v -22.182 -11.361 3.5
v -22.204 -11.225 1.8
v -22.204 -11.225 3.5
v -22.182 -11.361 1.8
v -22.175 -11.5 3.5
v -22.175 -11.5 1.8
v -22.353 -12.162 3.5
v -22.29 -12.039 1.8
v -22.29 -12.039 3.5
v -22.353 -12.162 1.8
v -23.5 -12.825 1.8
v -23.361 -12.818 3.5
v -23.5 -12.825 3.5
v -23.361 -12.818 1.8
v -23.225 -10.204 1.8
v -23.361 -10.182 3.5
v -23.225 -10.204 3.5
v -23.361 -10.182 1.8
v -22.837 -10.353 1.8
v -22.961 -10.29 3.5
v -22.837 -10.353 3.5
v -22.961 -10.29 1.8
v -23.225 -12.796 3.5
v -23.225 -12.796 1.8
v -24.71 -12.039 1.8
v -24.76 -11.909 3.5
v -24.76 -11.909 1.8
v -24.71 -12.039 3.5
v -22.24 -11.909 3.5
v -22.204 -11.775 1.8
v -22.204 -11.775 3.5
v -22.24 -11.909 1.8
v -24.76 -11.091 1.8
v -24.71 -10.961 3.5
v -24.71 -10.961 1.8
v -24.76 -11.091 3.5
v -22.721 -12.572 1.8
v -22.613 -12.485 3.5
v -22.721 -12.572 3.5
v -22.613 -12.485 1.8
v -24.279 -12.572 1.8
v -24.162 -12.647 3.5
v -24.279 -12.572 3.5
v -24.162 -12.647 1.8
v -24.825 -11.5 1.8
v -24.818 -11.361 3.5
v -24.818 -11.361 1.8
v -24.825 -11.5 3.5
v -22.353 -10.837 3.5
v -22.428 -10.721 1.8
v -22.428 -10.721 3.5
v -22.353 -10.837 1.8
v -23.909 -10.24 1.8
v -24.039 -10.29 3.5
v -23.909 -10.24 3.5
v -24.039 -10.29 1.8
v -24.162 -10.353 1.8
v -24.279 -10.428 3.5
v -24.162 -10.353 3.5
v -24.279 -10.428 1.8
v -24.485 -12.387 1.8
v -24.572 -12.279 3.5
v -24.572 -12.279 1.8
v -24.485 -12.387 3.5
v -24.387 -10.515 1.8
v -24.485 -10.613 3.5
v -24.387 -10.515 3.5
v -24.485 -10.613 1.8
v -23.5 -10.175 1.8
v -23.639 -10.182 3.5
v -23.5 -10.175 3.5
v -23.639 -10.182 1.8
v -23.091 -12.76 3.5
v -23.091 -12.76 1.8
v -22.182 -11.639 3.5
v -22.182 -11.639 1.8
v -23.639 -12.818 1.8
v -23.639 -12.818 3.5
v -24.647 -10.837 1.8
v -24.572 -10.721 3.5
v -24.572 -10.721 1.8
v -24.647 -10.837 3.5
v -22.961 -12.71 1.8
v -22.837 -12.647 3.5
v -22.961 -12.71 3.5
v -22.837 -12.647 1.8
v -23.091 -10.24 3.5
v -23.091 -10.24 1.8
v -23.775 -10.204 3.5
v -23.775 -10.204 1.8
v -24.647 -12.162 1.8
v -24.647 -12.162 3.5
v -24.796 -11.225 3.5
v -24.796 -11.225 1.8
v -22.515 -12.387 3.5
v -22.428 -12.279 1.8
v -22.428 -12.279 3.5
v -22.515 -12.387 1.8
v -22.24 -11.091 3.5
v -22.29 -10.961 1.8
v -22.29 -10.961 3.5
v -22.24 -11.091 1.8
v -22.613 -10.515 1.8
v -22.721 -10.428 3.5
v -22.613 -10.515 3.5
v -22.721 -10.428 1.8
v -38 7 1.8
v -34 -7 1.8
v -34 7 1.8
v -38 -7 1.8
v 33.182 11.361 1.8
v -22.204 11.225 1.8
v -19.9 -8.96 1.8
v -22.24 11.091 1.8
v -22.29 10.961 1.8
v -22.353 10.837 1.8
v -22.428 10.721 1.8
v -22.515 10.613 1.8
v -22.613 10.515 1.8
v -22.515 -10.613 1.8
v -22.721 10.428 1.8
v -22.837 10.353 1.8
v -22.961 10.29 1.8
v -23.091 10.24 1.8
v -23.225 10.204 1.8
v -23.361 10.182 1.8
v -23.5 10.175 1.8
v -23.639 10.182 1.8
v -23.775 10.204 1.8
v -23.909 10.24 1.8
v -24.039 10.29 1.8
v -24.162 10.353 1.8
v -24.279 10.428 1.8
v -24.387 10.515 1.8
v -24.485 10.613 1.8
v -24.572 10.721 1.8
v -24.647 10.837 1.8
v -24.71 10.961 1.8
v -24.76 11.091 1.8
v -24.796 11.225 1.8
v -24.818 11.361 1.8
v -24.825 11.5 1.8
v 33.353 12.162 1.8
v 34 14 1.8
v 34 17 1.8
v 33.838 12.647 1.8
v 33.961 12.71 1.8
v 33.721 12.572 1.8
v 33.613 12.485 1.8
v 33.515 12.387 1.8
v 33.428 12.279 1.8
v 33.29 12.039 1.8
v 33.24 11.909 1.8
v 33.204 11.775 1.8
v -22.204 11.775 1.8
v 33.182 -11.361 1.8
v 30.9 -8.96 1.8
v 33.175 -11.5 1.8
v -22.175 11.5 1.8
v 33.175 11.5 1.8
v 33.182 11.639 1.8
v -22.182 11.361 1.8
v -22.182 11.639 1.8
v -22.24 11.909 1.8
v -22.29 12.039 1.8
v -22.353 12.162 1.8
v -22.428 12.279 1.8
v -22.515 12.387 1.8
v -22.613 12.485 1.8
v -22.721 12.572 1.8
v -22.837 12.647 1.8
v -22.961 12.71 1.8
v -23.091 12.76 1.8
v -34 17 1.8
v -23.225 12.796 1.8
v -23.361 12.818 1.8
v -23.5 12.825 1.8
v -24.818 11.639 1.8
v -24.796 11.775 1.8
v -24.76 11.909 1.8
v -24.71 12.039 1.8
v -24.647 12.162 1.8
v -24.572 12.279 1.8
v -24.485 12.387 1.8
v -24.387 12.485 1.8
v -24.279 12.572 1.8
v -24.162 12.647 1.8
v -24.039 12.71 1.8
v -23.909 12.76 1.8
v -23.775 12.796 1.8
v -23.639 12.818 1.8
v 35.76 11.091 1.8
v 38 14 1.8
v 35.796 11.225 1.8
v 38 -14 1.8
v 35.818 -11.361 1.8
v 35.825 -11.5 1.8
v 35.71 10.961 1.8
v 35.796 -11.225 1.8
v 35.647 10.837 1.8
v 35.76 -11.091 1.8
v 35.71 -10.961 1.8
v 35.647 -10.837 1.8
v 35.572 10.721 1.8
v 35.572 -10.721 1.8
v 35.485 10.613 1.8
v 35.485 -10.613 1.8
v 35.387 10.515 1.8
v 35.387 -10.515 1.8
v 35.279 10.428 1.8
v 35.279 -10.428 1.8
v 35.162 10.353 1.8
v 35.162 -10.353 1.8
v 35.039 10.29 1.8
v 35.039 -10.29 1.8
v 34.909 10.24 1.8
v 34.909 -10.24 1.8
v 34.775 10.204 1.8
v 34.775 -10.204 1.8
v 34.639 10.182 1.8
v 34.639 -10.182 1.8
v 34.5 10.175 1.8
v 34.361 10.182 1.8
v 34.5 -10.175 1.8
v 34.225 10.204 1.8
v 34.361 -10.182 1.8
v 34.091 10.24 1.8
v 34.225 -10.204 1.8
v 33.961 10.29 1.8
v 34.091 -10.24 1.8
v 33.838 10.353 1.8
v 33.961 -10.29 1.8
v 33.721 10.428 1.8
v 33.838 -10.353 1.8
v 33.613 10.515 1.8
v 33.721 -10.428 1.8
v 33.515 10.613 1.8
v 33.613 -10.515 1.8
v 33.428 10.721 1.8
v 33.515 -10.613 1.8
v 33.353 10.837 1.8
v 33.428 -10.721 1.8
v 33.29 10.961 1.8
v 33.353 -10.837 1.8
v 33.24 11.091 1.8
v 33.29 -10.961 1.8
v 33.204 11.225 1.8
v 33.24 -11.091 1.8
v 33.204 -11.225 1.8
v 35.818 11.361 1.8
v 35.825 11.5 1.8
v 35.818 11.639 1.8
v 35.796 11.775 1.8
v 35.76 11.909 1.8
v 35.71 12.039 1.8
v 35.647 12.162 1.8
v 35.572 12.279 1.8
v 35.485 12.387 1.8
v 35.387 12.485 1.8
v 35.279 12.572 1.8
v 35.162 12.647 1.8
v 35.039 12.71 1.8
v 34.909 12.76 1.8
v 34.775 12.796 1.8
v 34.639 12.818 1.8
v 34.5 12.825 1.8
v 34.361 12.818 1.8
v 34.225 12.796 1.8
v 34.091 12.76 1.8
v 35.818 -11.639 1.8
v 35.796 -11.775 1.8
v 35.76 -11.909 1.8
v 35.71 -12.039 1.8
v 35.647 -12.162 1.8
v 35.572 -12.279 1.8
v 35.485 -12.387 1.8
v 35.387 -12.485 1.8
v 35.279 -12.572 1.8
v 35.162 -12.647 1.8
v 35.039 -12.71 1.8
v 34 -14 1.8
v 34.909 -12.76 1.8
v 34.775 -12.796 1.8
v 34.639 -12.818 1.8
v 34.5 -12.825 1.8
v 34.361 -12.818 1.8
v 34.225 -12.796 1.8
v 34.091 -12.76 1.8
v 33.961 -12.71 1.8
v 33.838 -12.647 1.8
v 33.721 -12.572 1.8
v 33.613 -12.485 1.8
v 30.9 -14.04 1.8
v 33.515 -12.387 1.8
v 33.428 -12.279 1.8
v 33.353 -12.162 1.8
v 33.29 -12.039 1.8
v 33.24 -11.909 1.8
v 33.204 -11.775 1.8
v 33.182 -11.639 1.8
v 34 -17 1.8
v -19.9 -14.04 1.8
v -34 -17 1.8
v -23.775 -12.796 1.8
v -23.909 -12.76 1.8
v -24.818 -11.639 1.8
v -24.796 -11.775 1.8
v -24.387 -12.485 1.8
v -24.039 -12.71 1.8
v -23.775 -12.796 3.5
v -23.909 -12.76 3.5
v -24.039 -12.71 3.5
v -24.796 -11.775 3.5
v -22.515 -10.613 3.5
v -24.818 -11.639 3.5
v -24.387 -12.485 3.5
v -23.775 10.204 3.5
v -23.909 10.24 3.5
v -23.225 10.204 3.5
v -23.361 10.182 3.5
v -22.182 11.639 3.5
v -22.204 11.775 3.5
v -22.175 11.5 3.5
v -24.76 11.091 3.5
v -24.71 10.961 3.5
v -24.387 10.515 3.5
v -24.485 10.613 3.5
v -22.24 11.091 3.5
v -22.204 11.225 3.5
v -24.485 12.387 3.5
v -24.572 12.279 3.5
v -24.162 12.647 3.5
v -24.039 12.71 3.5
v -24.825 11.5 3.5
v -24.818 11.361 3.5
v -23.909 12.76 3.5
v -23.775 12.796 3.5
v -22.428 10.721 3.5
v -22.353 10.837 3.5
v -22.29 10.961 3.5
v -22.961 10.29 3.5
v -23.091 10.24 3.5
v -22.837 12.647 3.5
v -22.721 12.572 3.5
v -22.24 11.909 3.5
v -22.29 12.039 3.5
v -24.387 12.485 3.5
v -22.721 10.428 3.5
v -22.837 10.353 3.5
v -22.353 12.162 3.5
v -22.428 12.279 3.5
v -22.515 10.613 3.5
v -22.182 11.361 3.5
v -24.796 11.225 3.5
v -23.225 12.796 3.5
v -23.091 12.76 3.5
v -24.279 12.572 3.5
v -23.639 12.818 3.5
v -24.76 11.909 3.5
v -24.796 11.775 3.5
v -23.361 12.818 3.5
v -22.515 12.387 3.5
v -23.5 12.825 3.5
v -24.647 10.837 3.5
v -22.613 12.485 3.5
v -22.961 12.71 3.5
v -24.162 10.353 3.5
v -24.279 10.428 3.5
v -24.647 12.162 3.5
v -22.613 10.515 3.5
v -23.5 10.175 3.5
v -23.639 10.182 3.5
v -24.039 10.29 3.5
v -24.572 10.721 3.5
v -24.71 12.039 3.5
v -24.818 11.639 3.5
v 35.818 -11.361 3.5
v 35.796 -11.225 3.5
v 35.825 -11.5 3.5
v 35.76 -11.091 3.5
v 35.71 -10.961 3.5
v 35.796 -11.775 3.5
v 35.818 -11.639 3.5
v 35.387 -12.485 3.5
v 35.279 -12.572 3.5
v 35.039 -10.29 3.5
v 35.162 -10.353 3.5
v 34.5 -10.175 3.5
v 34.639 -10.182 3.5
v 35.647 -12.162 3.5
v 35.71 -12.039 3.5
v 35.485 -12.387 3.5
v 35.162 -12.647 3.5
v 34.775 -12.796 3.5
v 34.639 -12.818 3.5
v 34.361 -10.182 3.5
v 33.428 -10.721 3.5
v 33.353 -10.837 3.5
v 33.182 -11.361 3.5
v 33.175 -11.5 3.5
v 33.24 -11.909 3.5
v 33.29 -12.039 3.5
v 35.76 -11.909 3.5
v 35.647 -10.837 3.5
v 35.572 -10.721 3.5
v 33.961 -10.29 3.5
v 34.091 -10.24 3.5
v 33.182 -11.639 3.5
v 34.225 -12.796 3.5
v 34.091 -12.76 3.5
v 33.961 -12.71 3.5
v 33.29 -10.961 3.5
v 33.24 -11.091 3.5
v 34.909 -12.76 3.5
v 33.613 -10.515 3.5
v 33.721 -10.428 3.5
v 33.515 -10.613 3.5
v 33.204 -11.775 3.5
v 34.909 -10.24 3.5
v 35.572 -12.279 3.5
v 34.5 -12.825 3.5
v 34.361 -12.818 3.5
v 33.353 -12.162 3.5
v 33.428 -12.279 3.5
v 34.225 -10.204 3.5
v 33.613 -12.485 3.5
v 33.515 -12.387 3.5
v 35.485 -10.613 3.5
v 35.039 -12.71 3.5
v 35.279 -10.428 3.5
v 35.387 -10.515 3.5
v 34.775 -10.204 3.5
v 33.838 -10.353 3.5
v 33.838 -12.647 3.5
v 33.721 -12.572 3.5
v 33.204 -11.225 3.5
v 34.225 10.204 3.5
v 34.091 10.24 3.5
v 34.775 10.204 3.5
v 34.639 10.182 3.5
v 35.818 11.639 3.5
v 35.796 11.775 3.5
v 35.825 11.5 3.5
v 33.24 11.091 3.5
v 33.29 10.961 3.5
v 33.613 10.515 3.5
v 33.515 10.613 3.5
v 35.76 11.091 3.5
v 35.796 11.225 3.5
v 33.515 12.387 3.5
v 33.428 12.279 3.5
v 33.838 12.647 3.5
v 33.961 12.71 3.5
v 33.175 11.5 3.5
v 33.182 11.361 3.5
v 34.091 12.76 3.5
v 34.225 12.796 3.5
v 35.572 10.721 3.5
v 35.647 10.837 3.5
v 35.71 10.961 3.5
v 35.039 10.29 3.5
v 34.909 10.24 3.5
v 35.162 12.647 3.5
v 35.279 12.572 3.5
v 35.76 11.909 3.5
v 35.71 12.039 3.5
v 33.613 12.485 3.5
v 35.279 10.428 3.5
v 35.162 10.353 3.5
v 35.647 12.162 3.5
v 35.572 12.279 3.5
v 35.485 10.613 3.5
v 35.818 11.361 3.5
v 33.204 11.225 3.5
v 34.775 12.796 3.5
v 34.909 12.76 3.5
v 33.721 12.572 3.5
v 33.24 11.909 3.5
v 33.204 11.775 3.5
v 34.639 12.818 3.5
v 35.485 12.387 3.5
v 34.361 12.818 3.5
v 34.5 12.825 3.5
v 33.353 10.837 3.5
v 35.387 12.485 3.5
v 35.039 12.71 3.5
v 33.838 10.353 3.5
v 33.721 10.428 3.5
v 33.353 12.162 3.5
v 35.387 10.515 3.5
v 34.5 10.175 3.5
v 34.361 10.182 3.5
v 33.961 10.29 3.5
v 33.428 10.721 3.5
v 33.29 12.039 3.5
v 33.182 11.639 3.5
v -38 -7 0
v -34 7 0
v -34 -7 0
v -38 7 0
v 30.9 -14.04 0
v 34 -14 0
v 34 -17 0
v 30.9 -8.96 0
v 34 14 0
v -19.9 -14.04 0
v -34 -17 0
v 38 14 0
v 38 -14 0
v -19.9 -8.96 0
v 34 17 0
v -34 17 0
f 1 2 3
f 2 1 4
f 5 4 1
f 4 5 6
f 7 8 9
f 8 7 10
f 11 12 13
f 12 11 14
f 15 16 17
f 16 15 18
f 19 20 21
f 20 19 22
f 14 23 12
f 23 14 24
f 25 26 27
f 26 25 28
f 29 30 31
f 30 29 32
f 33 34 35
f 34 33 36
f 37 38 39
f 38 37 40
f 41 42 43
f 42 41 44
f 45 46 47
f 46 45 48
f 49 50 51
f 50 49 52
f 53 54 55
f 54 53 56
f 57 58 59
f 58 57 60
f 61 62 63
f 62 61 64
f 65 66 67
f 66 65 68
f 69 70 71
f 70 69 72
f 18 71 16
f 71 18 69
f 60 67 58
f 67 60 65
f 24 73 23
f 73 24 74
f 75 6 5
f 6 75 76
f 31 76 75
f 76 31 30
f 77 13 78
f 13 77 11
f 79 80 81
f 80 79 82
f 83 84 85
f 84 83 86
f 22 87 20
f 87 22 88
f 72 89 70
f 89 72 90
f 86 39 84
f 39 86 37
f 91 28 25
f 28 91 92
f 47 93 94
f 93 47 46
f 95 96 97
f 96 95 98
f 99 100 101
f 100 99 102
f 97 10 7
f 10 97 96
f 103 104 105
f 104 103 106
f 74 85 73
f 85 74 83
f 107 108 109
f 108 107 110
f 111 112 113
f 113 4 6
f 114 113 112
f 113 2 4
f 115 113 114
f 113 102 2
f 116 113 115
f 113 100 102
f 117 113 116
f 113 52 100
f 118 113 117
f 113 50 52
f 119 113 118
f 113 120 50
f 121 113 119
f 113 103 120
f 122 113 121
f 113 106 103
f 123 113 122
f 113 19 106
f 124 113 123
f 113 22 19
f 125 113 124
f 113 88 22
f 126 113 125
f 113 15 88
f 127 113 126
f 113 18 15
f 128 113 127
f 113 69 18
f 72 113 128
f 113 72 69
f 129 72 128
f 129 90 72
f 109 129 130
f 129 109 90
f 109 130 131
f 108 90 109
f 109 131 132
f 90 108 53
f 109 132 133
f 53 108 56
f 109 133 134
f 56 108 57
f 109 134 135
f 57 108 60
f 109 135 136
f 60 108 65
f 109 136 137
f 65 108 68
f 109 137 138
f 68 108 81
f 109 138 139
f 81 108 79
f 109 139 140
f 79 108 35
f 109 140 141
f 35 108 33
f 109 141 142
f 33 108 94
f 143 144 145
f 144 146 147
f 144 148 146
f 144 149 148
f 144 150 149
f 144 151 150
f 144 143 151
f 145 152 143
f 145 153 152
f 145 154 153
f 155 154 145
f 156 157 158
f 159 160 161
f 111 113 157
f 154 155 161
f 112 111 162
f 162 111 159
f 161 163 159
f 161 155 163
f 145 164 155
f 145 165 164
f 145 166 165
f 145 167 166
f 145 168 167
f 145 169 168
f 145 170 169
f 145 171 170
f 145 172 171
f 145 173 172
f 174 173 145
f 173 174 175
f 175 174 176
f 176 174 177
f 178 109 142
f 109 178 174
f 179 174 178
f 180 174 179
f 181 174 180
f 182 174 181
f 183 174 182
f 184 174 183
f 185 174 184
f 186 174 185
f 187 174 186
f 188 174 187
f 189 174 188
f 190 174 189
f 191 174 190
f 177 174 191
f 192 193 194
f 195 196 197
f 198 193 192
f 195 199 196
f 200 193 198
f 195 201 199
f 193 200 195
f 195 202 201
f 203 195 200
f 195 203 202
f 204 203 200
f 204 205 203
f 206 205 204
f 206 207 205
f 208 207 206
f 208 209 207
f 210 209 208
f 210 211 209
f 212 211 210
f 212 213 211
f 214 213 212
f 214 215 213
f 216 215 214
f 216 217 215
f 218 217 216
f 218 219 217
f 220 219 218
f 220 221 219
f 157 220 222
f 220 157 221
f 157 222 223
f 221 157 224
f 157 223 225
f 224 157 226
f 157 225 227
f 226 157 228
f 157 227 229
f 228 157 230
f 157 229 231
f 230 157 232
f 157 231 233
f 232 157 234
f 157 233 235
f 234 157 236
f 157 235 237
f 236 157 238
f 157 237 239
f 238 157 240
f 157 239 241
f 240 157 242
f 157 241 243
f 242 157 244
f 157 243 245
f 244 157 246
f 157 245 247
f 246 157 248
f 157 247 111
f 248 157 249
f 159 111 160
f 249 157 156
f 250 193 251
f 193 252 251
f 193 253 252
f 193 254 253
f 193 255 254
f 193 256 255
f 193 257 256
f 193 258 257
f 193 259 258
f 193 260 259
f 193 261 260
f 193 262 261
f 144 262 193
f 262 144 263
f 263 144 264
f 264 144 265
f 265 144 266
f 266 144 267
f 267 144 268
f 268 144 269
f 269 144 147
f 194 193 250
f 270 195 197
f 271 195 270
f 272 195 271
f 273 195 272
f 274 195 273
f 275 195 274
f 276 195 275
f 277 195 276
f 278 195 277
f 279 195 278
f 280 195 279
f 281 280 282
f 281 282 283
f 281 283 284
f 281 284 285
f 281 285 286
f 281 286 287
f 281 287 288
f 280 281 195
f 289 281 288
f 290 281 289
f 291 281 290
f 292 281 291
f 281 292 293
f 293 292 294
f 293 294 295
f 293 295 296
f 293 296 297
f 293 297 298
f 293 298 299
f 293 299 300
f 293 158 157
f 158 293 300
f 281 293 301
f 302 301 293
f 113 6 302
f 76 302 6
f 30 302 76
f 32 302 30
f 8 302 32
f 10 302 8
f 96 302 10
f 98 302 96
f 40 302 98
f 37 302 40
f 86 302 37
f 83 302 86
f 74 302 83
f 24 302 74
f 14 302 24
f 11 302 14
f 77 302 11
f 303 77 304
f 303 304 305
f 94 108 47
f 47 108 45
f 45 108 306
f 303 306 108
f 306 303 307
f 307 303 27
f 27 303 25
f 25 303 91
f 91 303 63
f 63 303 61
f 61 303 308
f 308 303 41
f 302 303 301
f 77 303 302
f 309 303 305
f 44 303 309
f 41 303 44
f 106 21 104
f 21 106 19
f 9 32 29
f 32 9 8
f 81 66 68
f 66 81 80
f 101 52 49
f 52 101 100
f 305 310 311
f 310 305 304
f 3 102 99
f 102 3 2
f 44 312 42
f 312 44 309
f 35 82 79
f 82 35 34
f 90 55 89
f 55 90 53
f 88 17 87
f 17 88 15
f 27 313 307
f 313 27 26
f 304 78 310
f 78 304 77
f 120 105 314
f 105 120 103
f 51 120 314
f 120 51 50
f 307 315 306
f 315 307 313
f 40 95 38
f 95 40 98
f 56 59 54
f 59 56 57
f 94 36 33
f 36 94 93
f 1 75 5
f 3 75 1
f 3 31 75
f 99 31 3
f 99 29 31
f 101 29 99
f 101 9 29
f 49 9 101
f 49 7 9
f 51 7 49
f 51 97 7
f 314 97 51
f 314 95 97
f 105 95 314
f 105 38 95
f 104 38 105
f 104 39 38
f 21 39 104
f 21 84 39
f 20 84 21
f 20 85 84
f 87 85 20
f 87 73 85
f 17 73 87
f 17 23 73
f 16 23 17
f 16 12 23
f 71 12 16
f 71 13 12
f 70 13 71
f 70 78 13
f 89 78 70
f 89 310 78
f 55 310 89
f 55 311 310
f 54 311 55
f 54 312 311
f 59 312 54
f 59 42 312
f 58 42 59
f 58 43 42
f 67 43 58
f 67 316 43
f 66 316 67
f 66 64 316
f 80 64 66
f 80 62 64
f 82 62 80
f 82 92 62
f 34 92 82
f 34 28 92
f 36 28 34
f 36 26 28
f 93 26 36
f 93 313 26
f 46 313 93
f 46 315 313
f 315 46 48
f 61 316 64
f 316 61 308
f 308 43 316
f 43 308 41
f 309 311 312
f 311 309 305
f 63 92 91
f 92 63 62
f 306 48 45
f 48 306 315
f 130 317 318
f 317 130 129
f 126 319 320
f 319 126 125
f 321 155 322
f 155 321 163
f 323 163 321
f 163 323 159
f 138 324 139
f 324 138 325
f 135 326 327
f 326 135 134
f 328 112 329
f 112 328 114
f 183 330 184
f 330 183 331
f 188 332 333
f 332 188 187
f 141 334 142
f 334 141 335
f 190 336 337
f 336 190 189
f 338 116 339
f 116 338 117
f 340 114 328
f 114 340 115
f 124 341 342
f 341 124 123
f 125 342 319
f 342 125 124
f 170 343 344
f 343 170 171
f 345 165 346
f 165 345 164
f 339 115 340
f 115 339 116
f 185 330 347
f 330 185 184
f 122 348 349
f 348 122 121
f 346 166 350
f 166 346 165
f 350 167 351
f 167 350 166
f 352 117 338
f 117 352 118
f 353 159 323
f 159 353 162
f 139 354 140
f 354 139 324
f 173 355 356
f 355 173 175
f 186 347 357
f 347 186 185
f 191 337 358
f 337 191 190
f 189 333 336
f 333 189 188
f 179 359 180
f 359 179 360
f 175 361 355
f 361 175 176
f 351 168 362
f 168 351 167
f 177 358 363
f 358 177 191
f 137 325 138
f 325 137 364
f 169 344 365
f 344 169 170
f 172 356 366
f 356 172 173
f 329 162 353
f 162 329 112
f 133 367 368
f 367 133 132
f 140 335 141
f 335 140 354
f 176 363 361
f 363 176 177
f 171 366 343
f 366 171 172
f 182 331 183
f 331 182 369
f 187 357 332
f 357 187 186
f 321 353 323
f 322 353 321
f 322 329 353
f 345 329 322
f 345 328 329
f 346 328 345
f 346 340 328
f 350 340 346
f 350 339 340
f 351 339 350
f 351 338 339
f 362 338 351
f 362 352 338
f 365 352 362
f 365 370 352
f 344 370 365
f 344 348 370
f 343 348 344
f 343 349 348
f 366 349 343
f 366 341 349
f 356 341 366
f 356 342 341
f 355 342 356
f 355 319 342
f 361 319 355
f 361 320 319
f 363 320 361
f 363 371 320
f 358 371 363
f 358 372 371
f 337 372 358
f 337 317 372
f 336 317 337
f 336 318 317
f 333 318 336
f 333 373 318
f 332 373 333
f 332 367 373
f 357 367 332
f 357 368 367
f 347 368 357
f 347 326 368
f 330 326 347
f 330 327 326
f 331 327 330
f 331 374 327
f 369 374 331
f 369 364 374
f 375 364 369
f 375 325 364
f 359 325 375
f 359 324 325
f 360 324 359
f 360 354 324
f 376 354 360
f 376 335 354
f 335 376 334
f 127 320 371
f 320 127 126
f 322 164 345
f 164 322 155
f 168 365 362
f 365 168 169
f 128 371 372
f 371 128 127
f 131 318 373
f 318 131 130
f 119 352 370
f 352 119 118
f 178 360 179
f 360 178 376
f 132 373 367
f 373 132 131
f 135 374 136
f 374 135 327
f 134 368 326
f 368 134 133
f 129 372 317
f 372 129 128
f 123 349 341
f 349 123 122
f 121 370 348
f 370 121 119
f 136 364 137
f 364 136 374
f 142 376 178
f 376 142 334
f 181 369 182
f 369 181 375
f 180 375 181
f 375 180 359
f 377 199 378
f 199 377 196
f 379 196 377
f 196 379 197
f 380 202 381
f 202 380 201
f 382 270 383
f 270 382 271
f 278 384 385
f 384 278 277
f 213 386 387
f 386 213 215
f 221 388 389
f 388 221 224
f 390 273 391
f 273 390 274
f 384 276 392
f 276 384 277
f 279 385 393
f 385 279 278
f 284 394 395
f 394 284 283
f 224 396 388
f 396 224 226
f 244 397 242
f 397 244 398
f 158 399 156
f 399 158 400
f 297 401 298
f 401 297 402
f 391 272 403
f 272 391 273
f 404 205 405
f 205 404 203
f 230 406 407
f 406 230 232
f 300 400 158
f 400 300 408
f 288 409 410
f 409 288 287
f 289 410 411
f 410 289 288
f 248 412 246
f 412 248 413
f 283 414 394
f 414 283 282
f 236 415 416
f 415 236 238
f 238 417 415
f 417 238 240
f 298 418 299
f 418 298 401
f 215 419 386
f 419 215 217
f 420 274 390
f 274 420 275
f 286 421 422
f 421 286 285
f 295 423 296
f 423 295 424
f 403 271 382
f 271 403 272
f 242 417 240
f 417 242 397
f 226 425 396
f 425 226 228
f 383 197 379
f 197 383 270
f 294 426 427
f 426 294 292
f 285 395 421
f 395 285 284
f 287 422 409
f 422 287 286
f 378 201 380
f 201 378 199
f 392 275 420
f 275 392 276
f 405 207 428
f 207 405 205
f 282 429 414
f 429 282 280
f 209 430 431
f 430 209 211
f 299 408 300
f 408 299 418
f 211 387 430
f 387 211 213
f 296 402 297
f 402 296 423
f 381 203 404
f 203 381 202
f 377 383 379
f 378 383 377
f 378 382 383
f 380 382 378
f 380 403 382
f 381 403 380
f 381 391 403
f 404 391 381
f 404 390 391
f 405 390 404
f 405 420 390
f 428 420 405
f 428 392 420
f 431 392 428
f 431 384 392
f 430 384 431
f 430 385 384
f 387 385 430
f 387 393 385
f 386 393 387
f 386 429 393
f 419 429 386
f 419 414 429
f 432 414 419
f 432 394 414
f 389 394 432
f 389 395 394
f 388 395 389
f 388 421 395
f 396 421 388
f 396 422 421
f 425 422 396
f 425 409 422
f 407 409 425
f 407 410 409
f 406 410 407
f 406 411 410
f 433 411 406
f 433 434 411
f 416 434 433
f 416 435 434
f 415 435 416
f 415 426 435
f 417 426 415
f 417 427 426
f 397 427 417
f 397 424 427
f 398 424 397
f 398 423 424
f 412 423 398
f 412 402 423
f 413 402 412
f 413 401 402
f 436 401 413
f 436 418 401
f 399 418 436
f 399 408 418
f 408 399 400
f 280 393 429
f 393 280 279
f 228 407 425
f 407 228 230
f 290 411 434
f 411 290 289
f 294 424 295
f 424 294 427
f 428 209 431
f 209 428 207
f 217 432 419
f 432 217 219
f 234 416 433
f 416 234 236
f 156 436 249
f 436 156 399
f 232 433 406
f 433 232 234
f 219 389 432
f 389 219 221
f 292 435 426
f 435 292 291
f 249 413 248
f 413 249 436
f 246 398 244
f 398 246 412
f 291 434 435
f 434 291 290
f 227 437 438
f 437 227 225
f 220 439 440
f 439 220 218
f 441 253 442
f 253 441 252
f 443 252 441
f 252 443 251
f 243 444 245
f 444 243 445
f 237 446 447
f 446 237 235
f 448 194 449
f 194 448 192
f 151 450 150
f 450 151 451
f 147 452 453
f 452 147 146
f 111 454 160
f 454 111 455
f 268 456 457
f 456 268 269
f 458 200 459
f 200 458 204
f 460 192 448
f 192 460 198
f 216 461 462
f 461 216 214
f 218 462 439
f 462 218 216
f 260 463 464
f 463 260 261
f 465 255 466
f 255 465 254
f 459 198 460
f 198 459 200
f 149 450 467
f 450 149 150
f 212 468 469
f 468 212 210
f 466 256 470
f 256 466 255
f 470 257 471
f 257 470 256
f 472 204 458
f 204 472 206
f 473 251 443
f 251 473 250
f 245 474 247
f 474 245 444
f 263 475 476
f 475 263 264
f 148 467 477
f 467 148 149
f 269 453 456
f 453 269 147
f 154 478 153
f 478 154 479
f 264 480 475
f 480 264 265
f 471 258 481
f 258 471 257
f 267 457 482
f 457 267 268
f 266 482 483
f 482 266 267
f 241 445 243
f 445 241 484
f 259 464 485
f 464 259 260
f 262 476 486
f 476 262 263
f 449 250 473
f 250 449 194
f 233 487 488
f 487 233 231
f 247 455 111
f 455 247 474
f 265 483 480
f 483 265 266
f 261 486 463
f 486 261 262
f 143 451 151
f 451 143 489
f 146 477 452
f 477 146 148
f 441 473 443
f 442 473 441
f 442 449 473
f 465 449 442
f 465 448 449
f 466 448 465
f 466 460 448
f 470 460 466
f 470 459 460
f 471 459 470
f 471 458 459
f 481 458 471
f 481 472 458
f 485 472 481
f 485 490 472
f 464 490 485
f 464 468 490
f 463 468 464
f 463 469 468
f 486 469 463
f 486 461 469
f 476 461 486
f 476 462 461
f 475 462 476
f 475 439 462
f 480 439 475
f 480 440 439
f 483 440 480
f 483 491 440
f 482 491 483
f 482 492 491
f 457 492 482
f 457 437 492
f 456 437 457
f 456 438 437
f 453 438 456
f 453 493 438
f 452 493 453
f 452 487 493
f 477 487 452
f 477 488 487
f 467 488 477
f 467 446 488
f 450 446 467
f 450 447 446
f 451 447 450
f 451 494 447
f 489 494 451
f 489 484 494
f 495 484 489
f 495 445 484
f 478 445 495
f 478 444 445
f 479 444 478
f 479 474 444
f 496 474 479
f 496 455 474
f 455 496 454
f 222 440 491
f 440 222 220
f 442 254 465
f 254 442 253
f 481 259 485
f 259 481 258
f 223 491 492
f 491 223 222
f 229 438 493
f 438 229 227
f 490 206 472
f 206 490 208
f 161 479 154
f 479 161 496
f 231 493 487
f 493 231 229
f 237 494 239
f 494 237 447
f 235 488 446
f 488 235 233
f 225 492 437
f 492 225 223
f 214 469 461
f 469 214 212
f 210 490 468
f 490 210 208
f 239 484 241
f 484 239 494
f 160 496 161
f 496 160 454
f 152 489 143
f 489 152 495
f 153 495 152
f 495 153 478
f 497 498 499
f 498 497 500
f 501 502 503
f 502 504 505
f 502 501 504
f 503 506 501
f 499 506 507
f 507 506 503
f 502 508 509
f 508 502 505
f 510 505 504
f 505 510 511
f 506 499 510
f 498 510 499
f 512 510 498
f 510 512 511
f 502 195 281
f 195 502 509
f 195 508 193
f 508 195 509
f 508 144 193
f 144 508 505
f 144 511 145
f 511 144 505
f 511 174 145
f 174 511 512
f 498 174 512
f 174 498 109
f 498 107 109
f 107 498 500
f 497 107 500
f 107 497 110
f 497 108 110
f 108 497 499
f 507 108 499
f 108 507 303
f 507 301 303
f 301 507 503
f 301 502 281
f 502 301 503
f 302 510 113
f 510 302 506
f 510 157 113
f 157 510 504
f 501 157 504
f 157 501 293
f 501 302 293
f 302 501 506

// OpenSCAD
// file: ../include/tube.scad
// Simple tube
// r is the outer radius
// w is the width of the tube wall
module tube(h, r, w) {
  difference() {
    cylinder(h = h, r = r);
    translate([0, 0, - 1])
      cylinder(h = h + 2, r = r - w);
  }
}
// file: ../vitamin/pcb.scad
// Modules and constants for mocking up printed circuit boards

// Conventions:
// -- the long side is x, narrow side is y
// -- the bottom of the board is at z=0

// Header base
hdr_base_x = 2.5;
hdr_base_y = 2.5;
hdr_base_z = 2.5;

// Header pin
hdr_pin_x = 0.7;
hdr_pin_y = 0.7;
hdr_pin_z = 11.75;

// Common components, spec: [x size, y size, z size, color]
micro_usb = [5.0, 7.5, 2.5, "silver"];
jst2 = [6.0, 8.0, 5.6, "black"];
hdmi = [7.25, 11.25, 3.3, "Silver"];
sd_card_holder = [12.0, 11.5, 1.3, "Silver"];

// Printed circuit board with rounded corners
module pcb(x, y, board_h = 1.5, r = 2.5) {
  x_pos = x / 2 - r;
  y_pos = y / 2 - r;

  hull() for (i = [- x_pos, x_pos], j = [- y_pos, y_pos]) {
    translate([i, j, 0]) cylinder(r = r, h = board_h);
  }
}

// Hole in the pcb
module pcb_hole(x, y, r, board_h = 1.5) {
  translate([x, y, - 0.1]) cylinder(h = board_h + 0.2, r = r);
}

// Component that sits on top of the pcb
// Future: support bottom mounted components
module pcb_component(spec, x, y, yaw = 0.0, board_h = 1.5) {
  color(spec[3])
    translate([x, y, board_h + spec[2] / 2])
      rotate([0, 0, yaw])
        cube([spec.x, spec.y, spec.z], center = true);
}

// Header (base + pin)
module pcb_header(x, y, base_z, pin_z) {
  color("Black")
    translate([x, y, base_z])
      cube([hdr_base_x, hdr_base_y, hdr_base_z], center = true);
  color("Silver")
    translate([x, y, pin_z])
      cube([hdr_pin_x, hdr_pin_y, hdr_pin_z], center = true);
}
// file: ../vitamin/pi_zero.scad
include <pcb.scad>

// Options
show_pi = true;
show_gpio_header = 0;  // 0 = no headers, 1 = above, -1 = below
show_extra_header = false;  // 2x2 header for reset switch and RCA composite video

// PCB
pi_x = 65;
pi_y = 30;
pi_z = 1.6;
pi_half_z = pi_z / 2;
pi_corner_r = 3.0;

// Mount holes
pi_hole_edge = 3.5;  // Distance from edge to center of mount hole
pi_hole_d = 2.75;
pi_hole_r = pi_hole_d / 2;
pi_hole_x = pi_x / 2 - pi_hole_edge;
pi_hole_y = pi_y / 2 - pi_hole_edge;
pi_holes = [for (i = [- pi_hole_x, pi_hole_x], j = [- pi_hole_y, pi_hole_y]) [i, j]];

// Header holes
pi_header_pitch = 2.54; // 0.1in
pi_header_size = [20 * pi_header_pitch, 2 * pi_header_pitch];
pi_header_pos = [0, pi_y / 2 - pi_hole_edge]; // center=true

// Components, see pcb.scad::pcb_component()
csi_socket = [3, 17, 1.3, "Ivory"];
csi_clip = [1, 17, 1.3, "DimGray"];
activity_led = [2.3, 1, 1, "GreenYellow"];
cpu = [12, 12, 1.2, "Black"];

// Antenna
antenna_poly = [[- 6.5, - 11.4], [1.5, - 11.4], [- 1.5, - 13.5], [- 4, - 13.5], [- 6.5, - 11.4]];

// Header pin position calculators, return the center of the hole, pitch is 0.1"
function pin_pos_x(i) = - (19 * pi_header_pitch / 2) + i * pi_header_pitch;
function pin_pos_y(j) = pi_hole_y - pi_header_pitch / 2 + j * pi_header_pitch;

// Pi body and headers
module pi_zero() {
  if (show_pi) pi_zero_body();
  if (show_gpio_header) pi_headers(show_gpio_header);
}

// Just Pi body
module pi_zero_body() {
  color("#038f3f") difference() {
    pcb(pi_x, pi_y, pi_z, pi_corner_r);

    // Corner screw holes
    for (pi_hole = pi_holes) {
      pcb_hole(pi_hole.x, pi_hole.y, pi_hole_r, pi_z);
    }

    // GPIO header holes
    for (i = [0:19], j = [0, 1]) {
      pcb_hole(pin_pos_x(i), pin_pos_y(j), 0.5, pi_z);
    }

    // Extra header holes
    for (i = [18, 19], j = [- 1, - 2]) {
      pcb_hole(pin_pos_x(i), pin_pos_y(j), 0.5, pi_z);
    }
  }

  // Components
  pcb_component(cpu, - 7.1, - 2);
  pcb_component(sd_card_holder, - 24.5, 1.9, yaw = 90);
  pcb_component(hdmi, - 20.1, - 11.4, yaw = 90);  // TODO check height!
  pcb_component(micro_usb, 8.9, - 13, yaw = 90);  // Data
  pcb_component(micro_usb, 21.5, - 13, yaw = 90);  // Power
  pcb_component(activity_led, 26.5, - 8);
  pcb_component(csi_socket, 30, 0);
  pcb_component(csi_clip, 32, 0);

  // Antenna
  color("DarkGreen") translate([0, 0, 0.1]) linear_extrude(height = pi_z) polygon(antenna_poly);
}

// Pi headers
module pi_headers(direction = 1) {
  base_z = pi_half_z + direction * (pi_half_z + hdr_base_z / 2);
  pin_z = pi_half_z + direction * (pi_half_z + hdr_pin_z / 2 - 3);

  for (i = [0:19], j = [0, 1]) {
    pcb_header(pin_pos_x(i), pin_pos_y(j), base_z, pin_z);
  }

  if (show_extra_header) {
    for (i = [18, 19], j = [- 1, - 2]) {
      pcb_header(pin_pos_x(i), pin_pos_y(j), base_z, pin_z);
    }
  }
}

// Preview:
//$fn = 60;
//pi_zero();
// file: ../vitamin/blue_robotics.scad
include <../include/tube.scad>

// 2" flange dimensions
flange_h = 21.5;
flange_w = 6;

// TODO camera flange hole orientation is arbitrary, 0, 90, 180, 270 would be more useful

// Flange exterior portion
flange_ext_h = 6;
flange_ext_r = 25;
flange_ext_hole_offset = 23;  // Approximate
flange_ext_holes = [for (angle = [30, 90, 150, 210, 270, 330])
  [cos(angle) * flange_ext_hole_offset, sin(angle) * flange_ext_hole_offset]];

// Flange interior portion
flange_int_h = flange_h - flange_ext_h;
flange_int_r = flange_ext_r - flange_w;
flange_int_hole_offset = 21.5;
flange_int_holes = [for (angle = [30, 120, 210, 300])
  [cos(angle) * flange_int_hole_offset, sin(angle) * flange_int_hole_offset]];

// The pen and cam brackets are flipped upside down, so provide a set of holes that match
flange_int_holes_flipped = [for (angle = [60, 150, 240, 330])
  [cos(angle) * flange_int_hole_offset, sin(angle) * flange_int_hole_offset]];

// 2" tube dimensions
tube_h = 120;
tube_wall = 3.2;
tube_r_inside = 25.4;
tube_r_outside = tube_r_inside + tube_wall;

// Flange exterior 2d pattern
module flange_ext_2d() {
  difference() {
    circle(r = 28.5);
    circle(r = 28.5 - 9.5);

    // Six exterior holes
    for (ext_hole = flange_ext_holes) {
      translate([ext_hole.x, ext_hole.y]) circle(r = 1);
    }
  }
}

// Flange interior 2d pattern
module flange_int_2d() {
  difference() {
    circle(r = flange_ext_r);
    circle(r = flange_ext_r - flange_w);

    // Four interior holes
    for (int_hole = flange_int_holes) {
      translate([int_hole.x, int_hole.y]) circle(r = 1);
    }
  }
}

// BlueRobotics 2" flange
// Aligned so that the 2 penetrations run along the x axis
module flange() {
  // Exterior tube
  linear_extrude(height = flange_ext_h)
    flange_ext_2d();

  // Interior tube
  translate([0, 0, flange_ext_h]) linear_extrude(height = flange_int_h)
    flange_int_2d();
}

// BlueRobotics 2" tube
module two_inch_tube() {
  tube(h = tube_h, r = tube_r_outside, w = tube_wall);
}

// Switch and wires -- just the bits that stick into the tube
module switch_and_wires() {
  cylinder(h = 10, r = 4);
}

// Camera flange
module cam_flange() {
  flange();
}

// Penetration flange with the switch and wires
module pen_flange() {
  flange();

  // One of the two penetrations has a switch and wires sticking into the interior
  //translate([-cos(0) * 9, sin(0) * 9, flange_h]) switch_and_wires();
  translate([- cos(180) * 9, sin(180) * 9, flange_h]) switch_and_wires();
}

// Preview:
//$fn = 60;
//two_inch_tube();
//cam_flange();
//pen_flange();
// file: ../vitamin/adafruit.scad
include <pcb.scad>

pb_size = [36.2, 22.86];
pb_z = 1.6;
pb_hole_r = 1.25; // Measured
pb_hole_x = 36.2 / 2 - 2.5;
pb_hole_y = 17.65 / 2;
pb_holes = [for (j = [- pb_hole_y, pb_hole_y]) [pb_hole_x, j]];
pb_header_pitch = 2.54; // 0.1in
pb_header_size = [pb_header_pitch, 8 * pb_header_pitch];
pb_header_pos = [pb_size.x / 2 - 21.72, pb_size.y / 2 - 1]; // center=true

battery_d = 18.5; // Measured
battery_r = battery_d / 2;
battery_h = 69;

// Adafruit Powerboost 1000 Charger
// https://www.adafruit.com/product/2465
module power_boost() {
  color("#065daa") difference() {
    pcb(pb_size.x, pb_size.y);

    for (hole = pb_holes) {
      pcb_hole(hole.x, hole.y, pb_hole_r, pb_z);
    }

    pb_header_hole_r = 0.5;
    pb_header_hole_x_start = pb_header_pos.x - 3.5 * pb_header_pitch;
    pb_header_hole_y_end = pb_header_pos.x + 3.5 * pb_header_pitch;
    pb_header_holes = [for (j = [pb_header_hole_x_start:pb_header_pitch:pb_header_hole_y_end]) [j, pb_header_pos.y]];
    for (hole = pb_header_holes) {
      pcb_hole(hole.x, hole.y, pb_header_hole_r, pb_z);
    }
  }

  pcb_component(micro_usb, 36.2 / 2 - 2, 0);
  pcb_component(jst2, 7.5, - 8, 90);
  pcb_component([5, 5, 3.9, "black"], - 3, - 4);
}

// Adafruit Lithium Ion Cylindrical Battery - 3.7v 2200mAh
// https://www.adafruit.com/product/1781
module battery() {
  color("#02a5fe") cylinder(h = battery_h, r = battery_r);
}

// Preview:
//$fn = 60;
//power_boost();
//battery();
// file: ../part/ec_common.scad
include <../vitamin/adafruit.scad>
include <../vitamin/blue_robotics.scad>
include <../vitamin/pi_zero.scad>

// All tolerances measured for my Prusa MK3S + PLA + 0.15mm layers

// Good M2 hole radius
M2_hole_r = 1.1;

// When printed sideways it needs to be a bit smaller
M2_hole_side_print_r = 1;

// Build a structure with 2 circular ("ring") brackets connected by 2 flat trays
// The trays have tabs that slot into the cam_bracket and the pen_bracket

// Overall structure size:
structure_h = 76;
bracket_ring_h = 4;
tray_length = structure_h - 2 * bracket_ring_h;

// Bracket radius, slightly smaller than the inside of the tube
bracket_r = tube_r_inside - 0.2;

// Interior radius, slightly smaller than the inside of the flange
interior_r = flange_int_r - 0.2;

// Tray sizes
pi_tray_size = [tray_length, 34, 1.8];
pb_tray_size = [tray_length, 40, 1.8];

// How the trays are positioned in the brackets
pi_slot_position = 18;
pb_slot_position = 8;

// Adjust boards to be center=true
pi_center_offset = pi_slot_position - pi_tray_size.z / 2;
pb_center_offset = pb_slot_position - pb_tray_size.z / 2;

// Slots are slightly larger than tabs
tab_slot_tolerance = 0.15;

// The pi and pb boards also fit snugly into the brackets
board_slot_tolerance = 0.2;

// The pb_tray is attached to the pen_bracket and the cam_bracket at 2 points with M2 screws
attach = [4, 5, 5];
attach_hole_r = M2_hole_r;
attach_hole_side_print_r = M2_hole_side_print_r;
attach_cam_pos_y = 6;
attach_pen_pos_y = 15;

// Holes in pb_tray
attach_cam_holes = [[- 42, - attach_cam_pos_y], [- 42, attach_cam_pos_y]];
attach_pen_holes = [[40.5, - attach_pen_pos_y], [40.5, attach_pen_pos_y]];

// Nut positions in cam_bracket
nut_pb_cam_posns = [[2, - attach_cam_pos_y], [2, attach_cam_pos_y]];

// Tab widths
pi_cam_tab_width = 14;
pi_pen_tab_width = 28;
pb_cam_tab_width = 25;
pb_pen_tab_width = 35;

// Tab sizes
pi_cam_tab = [bracket_ring_h, pi_cam_tab_width];
pi_pen_tab = [bracket_ring_h, pi_pen_tab_width];
pb_cam_tab = [bracket_ring_h + 8, pb_cam_tab_width];
pb_pen_tab = [bracket_ring_h, pb_pen_tab_width];

// Slot sizes
pi_cam_slot = [pi_tray_size.z + tab_slot_tolerance, pi_cam_tab_width + tab_slot_tolerance];
pi_pen_slot = [pi_tray_size.z + tab_slot_tolerance, pi_pen_tab_width + tab_slot_tolerance];
pb_cam_slot = [pb_tray_size.z + tab_slot_tolerance, pb_cam_tab_width + tab_slot_tolerance];
pb_pen_slot = [pb_tray_size.z + tab_slot_tolerance, pb_pen_tab_width + tab_slot_tolerance];

// Slot positions
pi_cam_slot_pos = [pi_center_offset, 0];
pi_pen_slot_pos = [pi_center_offset, 0];
pb_cam_slot_pos = [pb_center_offset, 0];
pb_pen_slot_pos = [pb_center_offset, 0];

// PCB knockout sizes
pi_pcb_kn = [pi_z + board_slot_tolerance, 31];
pb_pcb_kn = [pb_z + board_slot_tolerance, 25.2];  // Same width as tray tab

// PCB knockout positions
pi_pcb_cam_kn_pos = [pi_cam_slot_pos.x - pi_cam_slot.x / 2 - pi_pcb_kn.x / 2, 0];
pi_pcb_pen_kn_pos = [pi_pen_slot_pos.x - pi_pen_slot.x / 2 - pi_pcb_kn.x / 2, 0];
pb_pcb_pen_kn_pos = [pb_pen_slot_pos.x - pb_pen_slot.x / 2 - pb_pcb_kn.x / 2, 0];

// Board component knockout sizes
pi_comp_kn = [3, 18];
pb_comp_kn = [3, 10];

// Board component knockout positions
pi_comp_cam_kn_pos = [pi_pcb_cam_kn_pos.x - pi_pcb_kn.x / 2 - pi_comp_kn.x / 2, 0];
pi_comp_pen_kn_pos = [pi_pcb_pen_kn_pos.x - pi_pcb_kn.x / 2 - pi_comp_kn.x / 2, 0];
pb_comp_pen_kn_pos = [pb_pcb_pen_kn_pos.x - pb_pcb_kn.x / 2 - pb_comp_kn.x / 2, 0];

// Mount the boards on the trays
pi_mount = [5.5, 0];
pb_mount = [20, 0];

// Boards sit slightly off the tray
mount_standoff = 0.3;

// The trays have nibs to hold the boards in place
pi_nib_h = pi_z + board_slot_tolerance / 2;
pb_nib_h = pb_z + board_slot_tolerance / 2;

// All assemblies are built with the camera facing down, where z=0 at the camera center point.
// The 2 trays share a common z, so that appears here.
tray_center_z = tray_length / 2 + flange_h + bracket_ring_h;

// Battery position
battery_pos = [- 9.5, 0, 9];
// file: ../part/pi_tray.scad
include <ec_common.scad>

// Pi tray 2d pattern
module pi_tray_2d() {
  difference() {
    union() {
      square([pi_tray_size.x, pi_tray_size.y], center = true);

      // Tabs fit into bracket slots
      translate([(pi_tray_size.x + pi_pen_tab.x) / 2, 0])
        square(pi_pen_tab, center = true);
      translate([- (pi_tray_size.x + pi_cam_tab.x) / 2, 0])
        square(pi_cam_tab, center = true);
    }

    // pi header knockout
    translate([pi_header_pos.x + pi_mount.x, - pi_header_pos.y - pi_mount.y])
      square([pi_header_size.x, pi_header_size.y], center = true);
  }
}

// Pi tray
module pi_tray() {
  linear_extrude(height = pi_tray_size.z)
    pi_tray_2d();

  // Nibs to hold the pi zero
  for (pi_hole = pi_holes) {
    translate([pi_hole.x + pi_mount.x, pi_hole.y + pi_mount.y, pi_tray_size.z])
      cylinder(h = pi_nib_h, r = pi_hole_r - 0.05);
  }
}
// main file
include <../part/pi_tray.scad>

// Hi-def render
$fn = 60;

pi_tray();
